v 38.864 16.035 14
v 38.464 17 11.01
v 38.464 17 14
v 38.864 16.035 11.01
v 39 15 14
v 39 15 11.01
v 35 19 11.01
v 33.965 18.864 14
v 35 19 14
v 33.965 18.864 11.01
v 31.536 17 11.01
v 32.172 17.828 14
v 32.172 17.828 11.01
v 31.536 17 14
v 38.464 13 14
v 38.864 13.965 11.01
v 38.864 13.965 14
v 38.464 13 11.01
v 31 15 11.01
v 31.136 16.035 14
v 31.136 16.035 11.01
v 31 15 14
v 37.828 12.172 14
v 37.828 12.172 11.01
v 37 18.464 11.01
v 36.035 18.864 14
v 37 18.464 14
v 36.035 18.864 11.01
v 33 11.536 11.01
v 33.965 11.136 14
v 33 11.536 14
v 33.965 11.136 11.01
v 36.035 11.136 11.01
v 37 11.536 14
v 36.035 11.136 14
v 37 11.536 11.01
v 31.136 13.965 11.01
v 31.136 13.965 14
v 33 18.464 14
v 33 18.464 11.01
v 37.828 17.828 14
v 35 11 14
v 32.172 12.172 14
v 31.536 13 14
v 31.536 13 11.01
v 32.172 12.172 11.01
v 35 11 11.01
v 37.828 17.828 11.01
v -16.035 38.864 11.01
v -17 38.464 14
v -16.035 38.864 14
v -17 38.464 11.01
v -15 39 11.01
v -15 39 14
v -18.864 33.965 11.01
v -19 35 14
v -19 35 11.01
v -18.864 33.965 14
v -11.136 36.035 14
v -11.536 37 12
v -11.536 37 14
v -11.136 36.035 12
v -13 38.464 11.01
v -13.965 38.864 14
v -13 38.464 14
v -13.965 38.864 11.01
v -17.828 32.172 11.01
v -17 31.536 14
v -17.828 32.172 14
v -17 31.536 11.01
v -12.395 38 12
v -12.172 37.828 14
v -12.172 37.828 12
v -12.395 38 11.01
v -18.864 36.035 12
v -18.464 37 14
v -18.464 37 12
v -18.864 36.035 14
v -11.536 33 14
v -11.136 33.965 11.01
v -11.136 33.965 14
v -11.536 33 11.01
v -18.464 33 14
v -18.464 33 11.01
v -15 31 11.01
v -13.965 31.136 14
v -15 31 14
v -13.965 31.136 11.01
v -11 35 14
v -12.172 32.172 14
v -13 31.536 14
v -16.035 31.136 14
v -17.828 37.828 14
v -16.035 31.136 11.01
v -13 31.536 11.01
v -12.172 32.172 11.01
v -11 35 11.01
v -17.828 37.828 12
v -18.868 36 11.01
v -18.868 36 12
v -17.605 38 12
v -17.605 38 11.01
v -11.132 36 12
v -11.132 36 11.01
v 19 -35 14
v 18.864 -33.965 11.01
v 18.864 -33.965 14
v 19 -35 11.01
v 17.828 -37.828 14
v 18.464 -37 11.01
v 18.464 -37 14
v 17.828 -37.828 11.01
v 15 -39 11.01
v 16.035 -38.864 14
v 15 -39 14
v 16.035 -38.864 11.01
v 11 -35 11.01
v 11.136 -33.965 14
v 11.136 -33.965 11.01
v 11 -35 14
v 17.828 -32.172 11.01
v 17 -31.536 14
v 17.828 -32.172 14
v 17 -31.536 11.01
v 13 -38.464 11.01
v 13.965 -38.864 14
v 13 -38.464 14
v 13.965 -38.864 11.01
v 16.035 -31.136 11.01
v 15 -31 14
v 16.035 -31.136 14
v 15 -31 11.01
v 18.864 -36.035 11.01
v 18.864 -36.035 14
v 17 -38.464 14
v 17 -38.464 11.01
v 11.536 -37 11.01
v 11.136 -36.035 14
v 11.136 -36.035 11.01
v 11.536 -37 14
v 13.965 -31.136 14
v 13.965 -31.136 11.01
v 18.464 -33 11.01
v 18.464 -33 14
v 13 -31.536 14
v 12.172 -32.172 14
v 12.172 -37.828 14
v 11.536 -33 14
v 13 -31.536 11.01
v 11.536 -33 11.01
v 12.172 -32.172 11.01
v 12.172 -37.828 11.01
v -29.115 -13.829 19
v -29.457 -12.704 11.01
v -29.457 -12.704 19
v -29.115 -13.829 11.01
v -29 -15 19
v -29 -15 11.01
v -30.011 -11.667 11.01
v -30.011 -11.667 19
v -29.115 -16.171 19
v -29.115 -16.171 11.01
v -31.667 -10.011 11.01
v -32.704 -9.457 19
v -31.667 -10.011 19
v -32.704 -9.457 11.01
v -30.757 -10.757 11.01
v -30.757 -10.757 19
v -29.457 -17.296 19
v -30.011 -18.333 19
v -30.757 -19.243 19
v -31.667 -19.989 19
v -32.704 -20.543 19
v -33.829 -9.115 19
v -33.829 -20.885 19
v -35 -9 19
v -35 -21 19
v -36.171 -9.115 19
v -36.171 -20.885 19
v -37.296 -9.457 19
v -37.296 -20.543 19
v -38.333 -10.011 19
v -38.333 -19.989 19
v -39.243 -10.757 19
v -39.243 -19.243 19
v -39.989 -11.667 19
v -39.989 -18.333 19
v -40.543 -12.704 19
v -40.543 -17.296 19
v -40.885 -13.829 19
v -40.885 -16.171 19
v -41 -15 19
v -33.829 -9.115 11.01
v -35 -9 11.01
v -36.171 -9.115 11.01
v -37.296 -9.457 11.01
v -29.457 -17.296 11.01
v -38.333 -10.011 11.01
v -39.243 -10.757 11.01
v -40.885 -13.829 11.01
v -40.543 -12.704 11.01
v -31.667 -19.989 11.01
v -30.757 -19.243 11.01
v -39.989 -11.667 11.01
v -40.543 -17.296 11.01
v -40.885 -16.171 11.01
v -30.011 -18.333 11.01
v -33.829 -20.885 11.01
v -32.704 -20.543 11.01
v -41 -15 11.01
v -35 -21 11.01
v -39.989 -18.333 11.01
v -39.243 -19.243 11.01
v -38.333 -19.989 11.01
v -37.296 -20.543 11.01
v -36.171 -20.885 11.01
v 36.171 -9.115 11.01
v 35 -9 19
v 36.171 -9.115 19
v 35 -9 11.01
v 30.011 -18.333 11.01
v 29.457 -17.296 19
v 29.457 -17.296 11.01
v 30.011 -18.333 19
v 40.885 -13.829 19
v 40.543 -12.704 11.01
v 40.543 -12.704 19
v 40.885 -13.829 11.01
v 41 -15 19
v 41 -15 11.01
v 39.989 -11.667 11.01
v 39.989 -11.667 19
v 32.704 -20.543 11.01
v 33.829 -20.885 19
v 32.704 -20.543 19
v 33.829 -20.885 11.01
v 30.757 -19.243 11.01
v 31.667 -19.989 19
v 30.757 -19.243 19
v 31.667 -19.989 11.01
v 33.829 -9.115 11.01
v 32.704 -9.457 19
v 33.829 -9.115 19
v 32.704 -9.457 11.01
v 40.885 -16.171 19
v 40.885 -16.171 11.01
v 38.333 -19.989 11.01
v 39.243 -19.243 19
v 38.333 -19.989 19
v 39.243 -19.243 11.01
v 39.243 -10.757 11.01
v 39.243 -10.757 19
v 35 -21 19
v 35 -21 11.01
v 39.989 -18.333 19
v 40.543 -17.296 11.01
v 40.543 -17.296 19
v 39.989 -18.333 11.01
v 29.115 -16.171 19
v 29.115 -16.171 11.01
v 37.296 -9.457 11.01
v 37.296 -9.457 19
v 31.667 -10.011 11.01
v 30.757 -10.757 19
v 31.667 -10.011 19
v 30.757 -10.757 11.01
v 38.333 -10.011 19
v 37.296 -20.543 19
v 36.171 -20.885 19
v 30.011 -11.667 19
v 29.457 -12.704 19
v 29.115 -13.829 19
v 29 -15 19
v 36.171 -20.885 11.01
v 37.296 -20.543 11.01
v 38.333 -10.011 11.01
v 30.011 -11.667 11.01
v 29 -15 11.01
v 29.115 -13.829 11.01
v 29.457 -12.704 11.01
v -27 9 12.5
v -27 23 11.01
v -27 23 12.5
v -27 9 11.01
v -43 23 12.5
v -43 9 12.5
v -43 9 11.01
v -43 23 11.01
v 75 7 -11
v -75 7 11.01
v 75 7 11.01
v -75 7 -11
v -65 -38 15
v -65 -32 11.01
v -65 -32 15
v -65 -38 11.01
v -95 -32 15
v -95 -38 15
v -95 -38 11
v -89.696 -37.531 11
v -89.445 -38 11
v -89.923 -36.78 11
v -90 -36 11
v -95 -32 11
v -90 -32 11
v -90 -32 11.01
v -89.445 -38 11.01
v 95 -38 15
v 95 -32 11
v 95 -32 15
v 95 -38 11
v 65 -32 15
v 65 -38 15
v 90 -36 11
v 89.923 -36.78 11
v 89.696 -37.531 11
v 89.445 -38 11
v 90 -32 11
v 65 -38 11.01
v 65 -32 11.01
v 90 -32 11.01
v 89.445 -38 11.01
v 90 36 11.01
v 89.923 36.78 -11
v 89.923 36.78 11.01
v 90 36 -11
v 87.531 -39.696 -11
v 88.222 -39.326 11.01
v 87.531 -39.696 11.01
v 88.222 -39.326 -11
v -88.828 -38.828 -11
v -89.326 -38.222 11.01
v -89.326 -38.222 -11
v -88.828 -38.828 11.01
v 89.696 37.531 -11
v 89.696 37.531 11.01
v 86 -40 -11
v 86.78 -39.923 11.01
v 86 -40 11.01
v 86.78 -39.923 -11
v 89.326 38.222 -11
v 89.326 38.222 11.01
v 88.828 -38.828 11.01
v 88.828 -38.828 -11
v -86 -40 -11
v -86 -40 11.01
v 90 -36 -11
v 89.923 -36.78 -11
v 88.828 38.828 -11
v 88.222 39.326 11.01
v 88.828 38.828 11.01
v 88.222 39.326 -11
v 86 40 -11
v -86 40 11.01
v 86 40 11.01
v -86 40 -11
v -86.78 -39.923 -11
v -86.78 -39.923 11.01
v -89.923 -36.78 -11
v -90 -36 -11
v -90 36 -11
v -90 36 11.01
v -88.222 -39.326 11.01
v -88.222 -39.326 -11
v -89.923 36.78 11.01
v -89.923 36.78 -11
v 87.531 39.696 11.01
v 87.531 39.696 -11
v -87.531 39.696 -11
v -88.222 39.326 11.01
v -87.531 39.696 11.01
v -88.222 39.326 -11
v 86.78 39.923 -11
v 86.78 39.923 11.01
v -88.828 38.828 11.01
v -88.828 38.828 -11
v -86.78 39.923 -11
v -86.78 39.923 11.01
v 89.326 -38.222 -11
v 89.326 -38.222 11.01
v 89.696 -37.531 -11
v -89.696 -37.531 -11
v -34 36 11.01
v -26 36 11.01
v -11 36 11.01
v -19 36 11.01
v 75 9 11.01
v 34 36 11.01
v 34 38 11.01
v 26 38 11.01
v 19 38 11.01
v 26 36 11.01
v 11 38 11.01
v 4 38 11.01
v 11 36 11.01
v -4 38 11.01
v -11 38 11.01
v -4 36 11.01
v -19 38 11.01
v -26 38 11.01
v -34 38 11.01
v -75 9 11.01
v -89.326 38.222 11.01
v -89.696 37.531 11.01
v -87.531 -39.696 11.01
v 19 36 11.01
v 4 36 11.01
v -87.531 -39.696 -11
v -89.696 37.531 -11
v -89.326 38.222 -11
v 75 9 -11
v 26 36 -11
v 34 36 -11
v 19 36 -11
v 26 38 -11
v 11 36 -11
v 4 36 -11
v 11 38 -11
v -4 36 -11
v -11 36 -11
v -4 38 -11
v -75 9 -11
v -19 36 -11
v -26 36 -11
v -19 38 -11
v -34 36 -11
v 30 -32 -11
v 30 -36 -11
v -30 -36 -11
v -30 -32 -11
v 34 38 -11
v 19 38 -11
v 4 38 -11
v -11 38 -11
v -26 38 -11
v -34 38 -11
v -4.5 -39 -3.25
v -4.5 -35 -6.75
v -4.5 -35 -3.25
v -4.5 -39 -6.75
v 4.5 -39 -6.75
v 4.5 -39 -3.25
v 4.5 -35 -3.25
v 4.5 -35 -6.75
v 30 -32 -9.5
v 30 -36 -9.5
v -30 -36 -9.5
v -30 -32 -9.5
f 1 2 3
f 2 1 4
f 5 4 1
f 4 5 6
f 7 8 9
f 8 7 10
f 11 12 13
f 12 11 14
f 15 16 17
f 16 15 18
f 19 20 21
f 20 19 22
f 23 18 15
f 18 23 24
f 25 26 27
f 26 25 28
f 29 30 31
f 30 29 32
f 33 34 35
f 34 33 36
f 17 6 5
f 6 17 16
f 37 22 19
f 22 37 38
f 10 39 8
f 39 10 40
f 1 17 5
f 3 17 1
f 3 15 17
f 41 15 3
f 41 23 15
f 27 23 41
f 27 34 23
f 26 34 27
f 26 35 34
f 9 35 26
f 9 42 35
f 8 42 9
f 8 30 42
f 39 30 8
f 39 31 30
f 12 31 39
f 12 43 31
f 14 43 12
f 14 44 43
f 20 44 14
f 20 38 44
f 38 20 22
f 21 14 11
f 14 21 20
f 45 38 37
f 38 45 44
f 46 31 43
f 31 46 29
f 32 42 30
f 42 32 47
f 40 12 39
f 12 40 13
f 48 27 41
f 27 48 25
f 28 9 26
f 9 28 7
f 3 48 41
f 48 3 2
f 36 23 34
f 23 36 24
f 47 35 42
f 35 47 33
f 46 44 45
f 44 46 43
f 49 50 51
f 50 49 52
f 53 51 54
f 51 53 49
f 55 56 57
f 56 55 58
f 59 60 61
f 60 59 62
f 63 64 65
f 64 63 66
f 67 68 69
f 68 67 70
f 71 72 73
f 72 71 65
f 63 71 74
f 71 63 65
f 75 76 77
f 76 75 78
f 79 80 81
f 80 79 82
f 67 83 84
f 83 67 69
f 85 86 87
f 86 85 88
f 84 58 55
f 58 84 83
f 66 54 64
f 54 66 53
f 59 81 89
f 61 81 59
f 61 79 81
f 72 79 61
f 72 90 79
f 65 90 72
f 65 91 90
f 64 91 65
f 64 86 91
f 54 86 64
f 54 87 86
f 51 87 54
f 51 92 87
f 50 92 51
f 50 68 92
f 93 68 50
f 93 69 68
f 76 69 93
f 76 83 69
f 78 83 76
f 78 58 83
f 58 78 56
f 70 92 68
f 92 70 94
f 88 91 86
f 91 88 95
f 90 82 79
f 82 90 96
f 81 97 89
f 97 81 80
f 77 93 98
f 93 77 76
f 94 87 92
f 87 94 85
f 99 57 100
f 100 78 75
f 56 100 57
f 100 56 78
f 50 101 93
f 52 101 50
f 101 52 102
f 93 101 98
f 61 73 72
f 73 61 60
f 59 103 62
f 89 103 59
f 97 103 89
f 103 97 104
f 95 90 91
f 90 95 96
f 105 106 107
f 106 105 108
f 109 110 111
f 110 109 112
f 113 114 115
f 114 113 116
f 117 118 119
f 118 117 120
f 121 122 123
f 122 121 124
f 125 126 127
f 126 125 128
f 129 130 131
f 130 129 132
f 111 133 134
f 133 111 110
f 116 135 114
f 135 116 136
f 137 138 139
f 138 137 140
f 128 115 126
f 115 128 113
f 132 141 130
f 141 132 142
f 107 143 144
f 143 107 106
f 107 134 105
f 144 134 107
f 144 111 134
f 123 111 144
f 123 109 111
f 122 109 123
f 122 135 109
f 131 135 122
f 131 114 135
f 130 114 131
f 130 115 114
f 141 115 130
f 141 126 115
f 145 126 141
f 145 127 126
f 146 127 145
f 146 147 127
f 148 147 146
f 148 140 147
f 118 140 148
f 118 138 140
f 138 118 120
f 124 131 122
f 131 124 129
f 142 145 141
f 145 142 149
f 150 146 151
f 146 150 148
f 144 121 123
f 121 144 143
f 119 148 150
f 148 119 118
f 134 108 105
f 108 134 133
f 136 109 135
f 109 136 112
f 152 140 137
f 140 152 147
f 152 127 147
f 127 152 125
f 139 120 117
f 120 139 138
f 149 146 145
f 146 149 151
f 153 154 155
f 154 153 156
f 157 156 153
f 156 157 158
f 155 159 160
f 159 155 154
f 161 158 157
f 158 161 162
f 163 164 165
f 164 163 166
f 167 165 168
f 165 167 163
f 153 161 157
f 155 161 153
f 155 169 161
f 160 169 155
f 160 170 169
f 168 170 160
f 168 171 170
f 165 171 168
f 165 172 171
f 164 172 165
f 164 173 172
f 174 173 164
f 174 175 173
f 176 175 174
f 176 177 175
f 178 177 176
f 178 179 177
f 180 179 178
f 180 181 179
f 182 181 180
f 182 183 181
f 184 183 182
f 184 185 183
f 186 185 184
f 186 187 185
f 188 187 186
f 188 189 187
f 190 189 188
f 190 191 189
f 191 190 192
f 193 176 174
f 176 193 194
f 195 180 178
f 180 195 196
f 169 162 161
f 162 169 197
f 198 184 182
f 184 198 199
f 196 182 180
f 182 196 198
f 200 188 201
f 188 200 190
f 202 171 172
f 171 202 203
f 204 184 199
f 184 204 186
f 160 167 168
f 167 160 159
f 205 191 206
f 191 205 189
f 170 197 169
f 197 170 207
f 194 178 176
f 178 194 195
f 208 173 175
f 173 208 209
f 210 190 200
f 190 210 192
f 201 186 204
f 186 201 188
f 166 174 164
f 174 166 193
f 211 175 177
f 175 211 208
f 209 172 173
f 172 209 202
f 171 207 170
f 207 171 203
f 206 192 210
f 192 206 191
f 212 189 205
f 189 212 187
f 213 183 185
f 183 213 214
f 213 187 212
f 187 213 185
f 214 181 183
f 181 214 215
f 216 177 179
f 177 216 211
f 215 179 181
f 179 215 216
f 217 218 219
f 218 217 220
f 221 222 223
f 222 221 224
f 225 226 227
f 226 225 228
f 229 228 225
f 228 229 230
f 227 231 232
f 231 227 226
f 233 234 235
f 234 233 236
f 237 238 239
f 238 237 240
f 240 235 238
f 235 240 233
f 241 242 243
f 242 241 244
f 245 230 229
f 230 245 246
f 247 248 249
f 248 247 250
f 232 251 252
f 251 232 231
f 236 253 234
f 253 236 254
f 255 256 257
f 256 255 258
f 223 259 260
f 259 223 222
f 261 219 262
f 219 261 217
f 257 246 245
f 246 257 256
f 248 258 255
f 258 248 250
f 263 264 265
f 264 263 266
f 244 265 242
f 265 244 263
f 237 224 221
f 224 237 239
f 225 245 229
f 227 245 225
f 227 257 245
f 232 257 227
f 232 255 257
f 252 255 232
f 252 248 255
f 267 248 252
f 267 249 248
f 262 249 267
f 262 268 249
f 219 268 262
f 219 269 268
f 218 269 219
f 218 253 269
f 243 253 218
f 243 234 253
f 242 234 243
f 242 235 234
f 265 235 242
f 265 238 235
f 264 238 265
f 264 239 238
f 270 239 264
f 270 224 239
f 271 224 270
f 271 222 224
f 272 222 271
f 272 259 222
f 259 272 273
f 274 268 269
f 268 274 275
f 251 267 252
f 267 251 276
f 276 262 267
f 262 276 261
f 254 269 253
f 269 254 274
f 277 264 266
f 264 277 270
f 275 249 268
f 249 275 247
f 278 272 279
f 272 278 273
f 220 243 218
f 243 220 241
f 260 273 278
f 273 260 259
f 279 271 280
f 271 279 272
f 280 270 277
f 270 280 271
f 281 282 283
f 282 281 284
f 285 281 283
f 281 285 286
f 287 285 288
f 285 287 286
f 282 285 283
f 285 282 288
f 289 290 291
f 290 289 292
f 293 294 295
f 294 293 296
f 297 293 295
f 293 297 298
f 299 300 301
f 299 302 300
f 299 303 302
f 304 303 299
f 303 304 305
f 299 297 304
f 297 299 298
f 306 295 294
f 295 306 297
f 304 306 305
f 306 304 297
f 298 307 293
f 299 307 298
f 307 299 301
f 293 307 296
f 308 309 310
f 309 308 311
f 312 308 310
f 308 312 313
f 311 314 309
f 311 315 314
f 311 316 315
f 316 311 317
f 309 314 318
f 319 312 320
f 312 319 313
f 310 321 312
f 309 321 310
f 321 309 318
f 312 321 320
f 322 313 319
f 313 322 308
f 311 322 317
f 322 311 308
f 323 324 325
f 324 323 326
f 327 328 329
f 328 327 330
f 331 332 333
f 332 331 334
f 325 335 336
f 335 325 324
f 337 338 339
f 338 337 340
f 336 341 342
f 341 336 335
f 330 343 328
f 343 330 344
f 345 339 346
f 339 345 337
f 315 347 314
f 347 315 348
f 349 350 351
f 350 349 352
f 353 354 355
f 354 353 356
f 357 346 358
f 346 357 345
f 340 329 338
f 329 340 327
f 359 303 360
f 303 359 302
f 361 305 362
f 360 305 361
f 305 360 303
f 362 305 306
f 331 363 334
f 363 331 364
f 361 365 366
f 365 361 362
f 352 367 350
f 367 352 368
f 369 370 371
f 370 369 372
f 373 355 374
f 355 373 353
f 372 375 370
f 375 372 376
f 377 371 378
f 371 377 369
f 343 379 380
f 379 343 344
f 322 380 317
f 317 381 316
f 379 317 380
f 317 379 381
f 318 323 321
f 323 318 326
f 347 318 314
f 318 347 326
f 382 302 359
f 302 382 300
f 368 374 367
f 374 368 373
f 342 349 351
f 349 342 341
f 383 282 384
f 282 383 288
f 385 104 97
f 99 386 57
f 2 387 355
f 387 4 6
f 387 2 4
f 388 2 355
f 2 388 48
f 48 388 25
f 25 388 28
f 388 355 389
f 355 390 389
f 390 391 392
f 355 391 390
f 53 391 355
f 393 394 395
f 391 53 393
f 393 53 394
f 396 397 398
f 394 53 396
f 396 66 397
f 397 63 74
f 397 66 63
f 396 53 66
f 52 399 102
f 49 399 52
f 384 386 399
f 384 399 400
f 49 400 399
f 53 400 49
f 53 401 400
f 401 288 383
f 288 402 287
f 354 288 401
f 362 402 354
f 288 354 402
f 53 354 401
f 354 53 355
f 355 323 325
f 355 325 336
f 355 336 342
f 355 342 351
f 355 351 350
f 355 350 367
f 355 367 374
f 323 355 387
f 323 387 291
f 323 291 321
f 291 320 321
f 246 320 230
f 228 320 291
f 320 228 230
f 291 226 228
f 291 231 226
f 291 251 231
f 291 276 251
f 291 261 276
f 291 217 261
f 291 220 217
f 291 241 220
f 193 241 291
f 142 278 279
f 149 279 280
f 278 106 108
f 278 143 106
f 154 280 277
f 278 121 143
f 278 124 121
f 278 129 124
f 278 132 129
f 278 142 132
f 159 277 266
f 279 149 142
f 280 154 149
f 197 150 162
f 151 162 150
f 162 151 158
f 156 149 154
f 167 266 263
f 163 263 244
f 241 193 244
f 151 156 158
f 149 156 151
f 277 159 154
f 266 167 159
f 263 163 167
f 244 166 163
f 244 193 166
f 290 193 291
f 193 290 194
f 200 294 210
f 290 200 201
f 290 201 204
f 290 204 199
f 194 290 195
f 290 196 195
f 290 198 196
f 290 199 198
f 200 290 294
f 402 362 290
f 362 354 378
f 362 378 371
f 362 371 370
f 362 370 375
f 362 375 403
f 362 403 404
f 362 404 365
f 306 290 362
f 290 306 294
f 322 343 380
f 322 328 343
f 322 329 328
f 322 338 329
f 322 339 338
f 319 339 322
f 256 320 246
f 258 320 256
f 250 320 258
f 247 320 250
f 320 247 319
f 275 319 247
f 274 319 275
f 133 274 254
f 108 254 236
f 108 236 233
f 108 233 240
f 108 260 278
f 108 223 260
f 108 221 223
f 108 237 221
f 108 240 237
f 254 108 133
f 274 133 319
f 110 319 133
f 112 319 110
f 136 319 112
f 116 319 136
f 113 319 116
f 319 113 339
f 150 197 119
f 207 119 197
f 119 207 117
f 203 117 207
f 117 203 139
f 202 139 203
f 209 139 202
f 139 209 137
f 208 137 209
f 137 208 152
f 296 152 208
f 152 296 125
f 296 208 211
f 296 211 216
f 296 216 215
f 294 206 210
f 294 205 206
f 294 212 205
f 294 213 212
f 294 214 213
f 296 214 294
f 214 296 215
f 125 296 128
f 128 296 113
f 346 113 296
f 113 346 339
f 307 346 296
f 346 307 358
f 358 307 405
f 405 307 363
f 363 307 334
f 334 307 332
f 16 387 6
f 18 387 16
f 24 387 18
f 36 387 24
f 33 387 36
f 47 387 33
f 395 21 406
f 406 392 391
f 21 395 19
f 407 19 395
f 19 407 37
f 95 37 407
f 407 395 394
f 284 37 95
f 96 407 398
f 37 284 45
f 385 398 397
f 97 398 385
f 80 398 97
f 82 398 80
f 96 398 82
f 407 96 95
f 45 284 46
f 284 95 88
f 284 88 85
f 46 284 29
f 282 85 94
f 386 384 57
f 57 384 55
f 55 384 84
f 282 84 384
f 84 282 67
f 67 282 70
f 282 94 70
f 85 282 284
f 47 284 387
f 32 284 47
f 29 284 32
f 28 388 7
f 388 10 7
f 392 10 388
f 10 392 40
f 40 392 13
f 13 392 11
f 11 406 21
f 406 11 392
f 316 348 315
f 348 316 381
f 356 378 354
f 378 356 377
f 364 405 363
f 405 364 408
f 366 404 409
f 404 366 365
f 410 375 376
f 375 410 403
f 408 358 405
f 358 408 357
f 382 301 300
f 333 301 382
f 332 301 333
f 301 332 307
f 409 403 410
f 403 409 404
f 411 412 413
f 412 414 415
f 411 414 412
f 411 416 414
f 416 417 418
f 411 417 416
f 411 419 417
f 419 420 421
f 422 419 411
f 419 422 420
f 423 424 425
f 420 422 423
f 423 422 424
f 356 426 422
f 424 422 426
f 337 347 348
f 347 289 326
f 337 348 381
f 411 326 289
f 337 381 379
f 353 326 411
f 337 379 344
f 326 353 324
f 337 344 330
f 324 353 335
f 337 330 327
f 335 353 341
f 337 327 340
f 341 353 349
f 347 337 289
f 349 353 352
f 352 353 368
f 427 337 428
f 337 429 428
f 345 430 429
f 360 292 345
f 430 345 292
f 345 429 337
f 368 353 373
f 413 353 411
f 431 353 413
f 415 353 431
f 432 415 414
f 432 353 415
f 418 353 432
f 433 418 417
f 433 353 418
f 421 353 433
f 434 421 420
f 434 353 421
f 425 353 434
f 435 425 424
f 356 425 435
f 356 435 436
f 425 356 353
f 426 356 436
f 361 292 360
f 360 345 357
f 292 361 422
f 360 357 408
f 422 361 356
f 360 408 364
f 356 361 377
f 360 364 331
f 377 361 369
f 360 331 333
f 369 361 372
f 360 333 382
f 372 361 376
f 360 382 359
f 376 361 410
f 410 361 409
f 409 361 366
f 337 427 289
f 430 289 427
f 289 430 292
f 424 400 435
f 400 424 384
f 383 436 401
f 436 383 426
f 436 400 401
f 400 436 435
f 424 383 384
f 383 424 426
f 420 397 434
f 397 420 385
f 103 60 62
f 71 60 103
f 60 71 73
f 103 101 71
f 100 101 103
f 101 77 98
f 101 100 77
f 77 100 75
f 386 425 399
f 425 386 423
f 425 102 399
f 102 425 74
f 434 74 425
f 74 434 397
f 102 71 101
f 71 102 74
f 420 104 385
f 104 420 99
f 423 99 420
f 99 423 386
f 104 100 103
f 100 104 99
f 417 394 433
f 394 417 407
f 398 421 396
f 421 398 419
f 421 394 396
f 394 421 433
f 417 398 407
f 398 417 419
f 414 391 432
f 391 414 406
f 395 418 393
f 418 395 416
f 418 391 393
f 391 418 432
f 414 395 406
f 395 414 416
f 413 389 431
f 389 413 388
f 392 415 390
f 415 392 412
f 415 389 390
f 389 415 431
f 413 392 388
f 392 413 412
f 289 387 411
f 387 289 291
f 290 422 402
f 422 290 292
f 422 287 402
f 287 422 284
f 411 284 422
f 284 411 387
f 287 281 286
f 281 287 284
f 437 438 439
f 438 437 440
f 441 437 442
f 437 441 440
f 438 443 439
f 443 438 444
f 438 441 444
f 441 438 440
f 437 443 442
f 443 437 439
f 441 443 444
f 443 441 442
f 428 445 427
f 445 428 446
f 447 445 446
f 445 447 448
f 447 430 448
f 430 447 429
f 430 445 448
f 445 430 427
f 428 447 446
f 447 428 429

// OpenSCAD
// file: common/labels.scad
// Label zones for video explanation
module label_zone(name) {
  // placeholder for annotation in renders
  children();
}
// file: common/branding.scad
module gunnch_badge() {
  linear_extrude(badge_h) translate([0,0,0]) square([badge_w, badge_w/3], center=true);
}
// file: common/ports.scad
module usb_c_cutout() {
  translate([0,0,-1]) cube([9, 3.5, wall+2], center=true);
}
module usb_a_cutout() {
  translate([0,0,-1]) cube([12, 5, wall+2], center=true);
}
module audio_3_5_cutout() {
  translate([0,0,-1]) cylinder(h=wall+2, d=6, $fn=32);
}
// file: common/dimensions.scad
// Shared dimensions — EVT-0 concept only
wall = 2;
corner_r = 4;
badge_w = 12;
badge_h = 3;
// file: handheld_hybrid/handheld_hybrid_concept.scad
include <../common/dimensions.scad>
include <../common/ports.scad>

body_l=180; body_w=80; body_h=22;

module handheld_body() {
  difference() {
    minkowski() {
      cube([body_l-2*corner_r, body_w-2*corner_r, body_h], center=true);
      cylinder(r=corner_r, h=0.01, $fn=32);
    }
  }
}

module screen_cutout() {
  translate([0,8,body_h/2-1]) cube([body_l-30, 2, body_w-20], center=true);
}

module controls() {
  // sticks
  translate([-35,-15,body_h/2]) cylinder(h=8, d=12, $fn=32);
  translate([35,-15,body_h/2]) cylinder(h=8, d=12, $fn=32);
  // d-pad
  translate([-35,15,body_h/2]) cube([16,16,3], center=true);
  // ABXY
  for (a=[0:3]) rotate([0,0,a*90]) translate([35,15,body_h/2]) cylinder(h=3, d=8, $fn=24);
  // shoulders
  translate([-body_l/2+10, -body_w/2+5, body_h/2+2]) cube([30,6,4], center=true);
  translate([body_l/2-10, -body_w/2+5, body_h/2+2]) cube([30,6,4], center=true);
}

difference() {
  union() { handheld_body(); controls(); }
  screen_cutout();
  // USB-C bottom
  translate([0,-body_w/2+2, -5]) rotate([90,0,0]) usb_c_cutout();
  // speaker grills
  for (i=[-2:2]) translate([i*15, body_w/2-3, 0]) cube([8,2,body_h+2], center=true);
  // dock groove
  translate([0,-body_w/2+6, -body_h/2]) cube([60,4,3], center=true);
}
// file: common_modules.scad
// EVT-1 common modules — dimensions/tolerances are placeholders, not final mechanical drawings
include <common/dimensions.scad>
include <common/ports.scad>
include <common/branding.scad>
include <common/labels.scad>

module screw_boss(r=2.5, h=6) { cylinder(r=r, h=h, $fn=24); }
module service_panel(w=40, h=20, t=2) { cube([w, h, t]); }
module cooling_vent(w=60, slots=5) {
  for (i=[0:slots-1]) translate([i*12-w/2, 0, 0]) cube([8, 2, 4], center=true);
}
module battery_compartment(w=80, d=60, h=8) { cube([w, d, h], center=true); }
module label_zone(w=30, h=10) { translate([0,0,0.1]) cube([w, h, 0.2]); }
// main file
// EVT-1 placeholder — dimensions/tolerances not final mechanical drawings
// Re-exports concept model from handheld_hybrid/handheld_hybrid_concept.scad
include <common_modules.scad>
include <handheld_hybrid/handheld_hybrid_concept.scad>
